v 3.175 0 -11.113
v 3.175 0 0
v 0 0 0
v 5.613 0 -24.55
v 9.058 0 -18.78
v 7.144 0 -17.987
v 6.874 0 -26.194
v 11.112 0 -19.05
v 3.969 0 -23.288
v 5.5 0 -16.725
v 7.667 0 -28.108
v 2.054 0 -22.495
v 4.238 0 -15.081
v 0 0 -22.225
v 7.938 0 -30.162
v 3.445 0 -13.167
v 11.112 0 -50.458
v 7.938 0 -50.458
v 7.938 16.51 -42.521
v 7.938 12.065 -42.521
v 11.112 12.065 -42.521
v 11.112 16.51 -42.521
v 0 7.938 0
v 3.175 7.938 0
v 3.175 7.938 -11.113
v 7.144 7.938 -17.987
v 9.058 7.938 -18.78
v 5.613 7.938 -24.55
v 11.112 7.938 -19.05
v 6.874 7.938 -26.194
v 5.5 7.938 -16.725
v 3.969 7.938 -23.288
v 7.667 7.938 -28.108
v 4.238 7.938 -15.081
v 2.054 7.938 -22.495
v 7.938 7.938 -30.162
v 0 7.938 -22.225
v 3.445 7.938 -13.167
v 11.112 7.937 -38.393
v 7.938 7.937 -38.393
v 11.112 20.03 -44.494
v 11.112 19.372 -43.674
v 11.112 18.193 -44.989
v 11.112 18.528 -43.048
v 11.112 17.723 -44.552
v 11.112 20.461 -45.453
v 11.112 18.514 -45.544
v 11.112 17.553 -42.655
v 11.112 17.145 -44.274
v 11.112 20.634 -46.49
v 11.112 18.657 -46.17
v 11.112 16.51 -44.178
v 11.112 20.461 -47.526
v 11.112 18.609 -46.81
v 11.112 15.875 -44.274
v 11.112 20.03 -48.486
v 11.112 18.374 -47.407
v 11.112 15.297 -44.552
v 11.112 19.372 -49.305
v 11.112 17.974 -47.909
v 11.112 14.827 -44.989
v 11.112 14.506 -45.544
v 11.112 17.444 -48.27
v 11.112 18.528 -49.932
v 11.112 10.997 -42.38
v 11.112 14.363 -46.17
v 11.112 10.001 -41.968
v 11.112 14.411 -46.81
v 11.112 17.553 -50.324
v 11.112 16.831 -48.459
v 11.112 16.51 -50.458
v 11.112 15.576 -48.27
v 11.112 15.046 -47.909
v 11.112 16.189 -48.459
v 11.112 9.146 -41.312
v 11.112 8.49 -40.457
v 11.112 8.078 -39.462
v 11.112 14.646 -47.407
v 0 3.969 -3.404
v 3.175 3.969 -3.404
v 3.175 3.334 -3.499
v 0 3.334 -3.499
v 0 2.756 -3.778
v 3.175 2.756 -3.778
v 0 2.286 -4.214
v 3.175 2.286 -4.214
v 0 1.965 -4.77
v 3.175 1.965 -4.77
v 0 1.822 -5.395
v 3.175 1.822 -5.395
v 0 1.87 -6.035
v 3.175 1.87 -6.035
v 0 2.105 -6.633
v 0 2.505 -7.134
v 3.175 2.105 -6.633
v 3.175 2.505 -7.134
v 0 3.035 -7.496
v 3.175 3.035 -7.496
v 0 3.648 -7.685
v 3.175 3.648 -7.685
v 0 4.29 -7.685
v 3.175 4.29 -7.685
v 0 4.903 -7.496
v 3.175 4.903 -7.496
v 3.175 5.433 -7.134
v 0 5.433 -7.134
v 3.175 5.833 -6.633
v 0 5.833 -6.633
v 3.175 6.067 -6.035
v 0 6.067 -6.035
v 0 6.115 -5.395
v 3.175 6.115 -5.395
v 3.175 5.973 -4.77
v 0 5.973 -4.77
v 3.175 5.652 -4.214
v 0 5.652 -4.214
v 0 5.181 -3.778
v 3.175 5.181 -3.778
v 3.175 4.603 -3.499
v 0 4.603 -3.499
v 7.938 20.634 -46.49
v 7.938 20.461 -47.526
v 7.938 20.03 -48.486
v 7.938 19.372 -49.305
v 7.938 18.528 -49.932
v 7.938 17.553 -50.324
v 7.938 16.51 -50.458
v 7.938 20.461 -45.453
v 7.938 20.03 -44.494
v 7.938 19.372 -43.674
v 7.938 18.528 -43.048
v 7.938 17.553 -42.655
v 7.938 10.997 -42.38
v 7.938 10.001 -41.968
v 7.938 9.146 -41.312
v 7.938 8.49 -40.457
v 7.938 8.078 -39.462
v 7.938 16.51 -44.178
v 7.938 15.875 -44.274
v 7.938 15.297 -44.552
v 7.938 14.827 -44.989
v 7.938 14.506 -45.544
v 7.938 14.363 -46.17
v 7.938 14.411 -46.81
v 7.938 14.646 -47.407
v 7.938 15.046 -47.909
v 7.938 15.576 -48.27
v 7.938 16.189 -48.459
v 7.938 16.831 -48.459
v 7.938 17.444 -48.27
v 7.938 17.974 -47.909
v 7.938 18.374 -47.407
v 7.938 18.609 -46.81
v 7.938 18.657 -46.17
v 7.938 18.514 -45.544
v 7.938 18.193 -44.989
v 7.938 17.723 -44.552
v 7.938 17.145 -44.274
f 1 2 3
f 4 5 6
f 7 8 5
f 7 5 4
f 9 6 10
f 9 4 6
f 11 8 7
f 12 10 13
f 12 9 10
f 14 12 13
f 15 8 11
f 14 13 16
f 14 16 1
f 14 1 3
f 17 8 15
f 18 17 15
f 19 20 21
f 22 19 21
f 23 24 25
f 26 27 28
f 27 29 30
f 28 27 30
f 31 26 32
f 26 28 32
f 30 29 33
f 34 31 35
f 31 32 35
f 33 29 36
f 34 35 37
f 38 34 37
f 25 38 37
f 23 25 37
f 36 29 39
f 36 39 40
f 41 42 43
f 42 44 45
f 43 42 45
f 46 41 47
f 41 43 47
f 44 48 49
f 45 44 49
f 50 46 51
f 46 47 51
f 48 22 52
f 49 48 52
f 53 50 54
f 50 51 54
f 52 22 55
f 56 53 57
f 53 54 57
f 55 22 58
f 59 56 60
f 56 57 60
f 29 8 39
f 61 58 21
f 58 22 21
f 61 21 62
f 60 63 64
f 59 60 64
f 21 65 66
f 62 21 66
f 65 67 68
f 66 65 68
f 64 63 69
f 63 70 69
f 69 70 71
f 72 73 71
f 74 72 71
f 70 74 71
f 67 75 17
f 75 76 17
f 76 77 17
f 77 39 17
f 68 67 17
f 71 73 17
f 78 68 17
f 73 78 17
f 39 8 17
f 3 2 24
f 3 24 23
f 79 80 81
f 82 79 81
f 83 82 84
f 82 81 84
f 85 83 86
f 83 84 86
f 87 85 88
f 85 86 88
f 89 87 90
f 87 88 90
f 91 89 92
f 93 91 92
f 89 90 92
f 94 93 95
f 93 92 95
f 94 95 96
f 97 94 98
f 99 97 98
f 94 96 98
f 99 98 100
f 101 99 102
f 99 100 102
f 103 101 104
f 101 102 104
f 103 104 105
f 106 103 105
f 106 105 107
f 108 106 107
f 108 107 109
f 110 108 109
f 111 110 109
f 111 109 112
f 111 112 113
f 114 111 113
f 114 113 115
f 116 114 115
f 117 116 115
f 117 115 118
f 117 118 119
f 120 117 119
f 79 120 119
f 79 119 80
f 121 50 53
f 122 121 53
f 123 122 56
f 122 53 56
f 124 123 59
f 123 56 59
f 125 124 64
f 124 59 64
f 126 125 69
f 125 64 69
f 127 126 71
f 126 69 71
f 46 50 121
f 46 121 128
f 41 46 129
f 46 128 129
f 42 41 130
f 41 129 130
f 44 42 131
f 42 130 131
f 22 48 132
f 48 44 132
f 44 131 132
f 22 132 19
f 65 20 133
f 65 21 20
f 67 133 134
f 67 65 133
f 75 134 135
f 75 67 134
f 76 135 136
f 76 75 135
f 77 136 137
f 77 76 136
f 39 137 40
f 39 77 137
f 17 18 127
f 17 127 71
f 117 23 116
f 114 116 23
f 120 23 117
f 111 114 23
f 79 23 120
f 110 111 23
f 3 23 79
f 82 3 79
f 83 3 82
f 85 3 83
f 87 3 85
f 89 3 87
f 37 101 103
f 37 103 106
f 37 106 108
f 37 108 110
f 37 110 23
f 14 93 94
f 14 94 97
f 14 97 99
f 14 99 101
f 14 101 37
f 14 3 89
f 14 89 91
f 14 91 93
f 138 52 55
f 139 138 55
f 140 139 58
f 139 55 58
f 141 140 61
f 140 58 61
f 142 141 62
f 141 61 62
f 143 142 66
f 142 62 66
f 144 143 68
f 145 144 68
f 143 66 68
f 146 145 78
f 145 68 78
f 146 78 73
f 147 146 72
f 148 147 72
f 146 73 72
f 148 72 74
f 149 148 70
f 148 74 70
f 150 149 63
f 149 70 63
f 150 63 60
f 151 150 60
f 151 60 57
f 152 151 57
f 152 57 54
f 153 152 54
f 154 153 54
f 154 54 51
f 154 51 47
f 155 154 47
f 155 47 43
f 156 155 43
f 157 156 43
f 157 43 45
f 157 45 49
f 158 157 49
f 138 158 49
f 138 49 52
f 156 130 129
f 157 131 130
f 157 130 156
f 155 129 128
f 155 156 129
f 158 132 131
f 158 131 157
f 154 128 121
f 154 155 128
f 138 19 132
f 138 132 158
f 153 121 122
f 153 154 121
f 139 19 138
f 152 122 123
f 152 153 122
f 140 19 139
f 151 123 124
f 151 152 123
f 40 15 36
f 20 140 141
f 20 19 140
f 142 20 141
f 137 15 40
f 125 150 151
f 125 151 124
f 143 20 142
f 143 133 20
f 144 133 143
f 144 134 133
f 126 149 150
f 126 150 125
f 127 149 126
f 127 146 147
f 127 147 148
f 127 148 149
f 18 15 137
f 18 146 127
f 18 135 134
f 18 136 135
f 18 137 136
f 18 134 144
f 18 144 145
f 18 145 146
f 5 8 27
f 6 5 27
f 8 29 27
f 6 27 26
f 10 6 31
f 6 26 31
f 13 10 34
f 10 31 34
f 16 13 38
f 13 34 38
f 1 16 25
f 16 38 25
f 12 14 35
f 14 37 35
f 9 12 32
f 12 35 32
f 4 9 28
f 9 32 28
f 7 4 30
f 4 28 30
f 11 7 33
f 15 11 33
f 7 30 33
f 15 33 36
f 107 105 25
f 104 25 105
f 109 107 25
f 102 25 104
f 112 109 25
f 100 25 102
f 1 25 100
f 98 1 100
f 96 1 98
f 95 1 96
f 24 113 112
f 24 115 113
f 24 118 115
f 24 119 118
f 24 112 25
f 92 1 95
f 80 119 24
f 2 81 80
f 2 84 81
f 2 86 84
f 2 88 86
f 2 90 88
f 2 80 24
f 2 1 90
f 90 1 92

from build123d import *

# Parameters (mm, degrees)
BOSS_EXTRUDE1_DEPTH   = 7.9375
FILLET1_R             = 7.9375
SKETCH6_W             = 3.175
SKETCH6_H             = 7.9375
BOSS_EXTRUDE2_DEPTH   = 12.7
FILLET2_R             = 4.1275
FILLET3_R             = 4.1275
F_6_CLEARANCE_HOLE1_D = 4.3053


# Some blends are built 0.0001 mm under size
with BuildPart() as part:
    # Sketch1 → Boss-Extrude1 (new body)
    with BuildSketch(Plane(origin=(0, 0, 0), x_dir=(1, 0, 0), z_dir=(0, 1, 0))):
        Polygon((0, 0), (0, 22.225), (7.9375, 22.225), (7.9375, 50.45837), (11.1125, 50.45837), (11.1125, 19.05), (3.175, 19.05), (3.175, 0), align=None)
    extrude(amount=BOSS_EXTRUDE1_DEPTH)

    # Fillet1
    fillet1_edges = [part.edges().sort_by_distance(p)[0] for p in [
        (7.9375, 3.96875, -22.225),
        (3.175, 3.96875, -19.05),
    ]]
    fillet(fillet1_edges, radius=FILLET1_R - 0.0001)  # a hair under: the kernel refuses the full size

    # Sketch6 → Boss-Extrude2 (add)
    with BuildSketch(Plane(origin=(0, 7.9375, 0), x_dir=(1, 0, 0), z_dir=(0, 1, 0))):
        with Locations((9.525, 46.48962)):
            Rectangle(SKETCH6_W, SKETCH6_H)
    extrude(amount=BOSS_EXTRUDE2_DEPTH)

    # Fillet2
    # the kernel refuses this fillet: 4.1275 mm, written as the material it takes off along each edge
    with BuildSketch(Plane(origin=(21.43125, 20.6375, -50.45837), x_dir=(0, -1, 0), z_dir=(-1, 0, 0))) as fillet2_piece_1:
        with BuildLine():
            CenterArc((FILLET2_R, FILLET2_R), FILLET2_R, 180, 90)
            Line((0, FILLET2_R), (0, 0))
            Line((0, 0), (FILLET2_R, 0))
        make_face()
    extrude(amount=23.8125, mode=Mode.SUBTRACT)
    with BuildSketch(Plane(origin=(-2.38125, 20.6375, -42.52087), x_dir=(0, 0, -1), z_dir=(1, 0, 0))) as fillet2_piece_2:
        with BuildLine():
            CenterArc((FILLET2_R, -FILLET2_R), FILLET2_R, 90, 90)
            Line((0, -FILLET2_R), (0, 0))
            Line((0, 0), (FILLET2_R, 0))
        make_face()
    extrude(amount=23.8125, mode=Mode.SUBTRACT)

    # Fillet3
    fillet3_edges = [part.edges().sort_by_distance(p)[0] for p in [
        (9.525, 7.9375, -42.52087),
    ]]
    fillet(fillet3_edges, radius=FILLET3_R)

    # #6 Clearance Hole1 (through all)
    with Locations(Plane(origin=(0, 0, 0), x_dir=(0, 0, -1), z_dir=(-1, 0, 0))):
        with Locations((5.55625, -3.96875), (46.33087, -16.51)):
            Hole(F_6_CLEARANCE_HOLE1_D / 2)


solid = part.part
